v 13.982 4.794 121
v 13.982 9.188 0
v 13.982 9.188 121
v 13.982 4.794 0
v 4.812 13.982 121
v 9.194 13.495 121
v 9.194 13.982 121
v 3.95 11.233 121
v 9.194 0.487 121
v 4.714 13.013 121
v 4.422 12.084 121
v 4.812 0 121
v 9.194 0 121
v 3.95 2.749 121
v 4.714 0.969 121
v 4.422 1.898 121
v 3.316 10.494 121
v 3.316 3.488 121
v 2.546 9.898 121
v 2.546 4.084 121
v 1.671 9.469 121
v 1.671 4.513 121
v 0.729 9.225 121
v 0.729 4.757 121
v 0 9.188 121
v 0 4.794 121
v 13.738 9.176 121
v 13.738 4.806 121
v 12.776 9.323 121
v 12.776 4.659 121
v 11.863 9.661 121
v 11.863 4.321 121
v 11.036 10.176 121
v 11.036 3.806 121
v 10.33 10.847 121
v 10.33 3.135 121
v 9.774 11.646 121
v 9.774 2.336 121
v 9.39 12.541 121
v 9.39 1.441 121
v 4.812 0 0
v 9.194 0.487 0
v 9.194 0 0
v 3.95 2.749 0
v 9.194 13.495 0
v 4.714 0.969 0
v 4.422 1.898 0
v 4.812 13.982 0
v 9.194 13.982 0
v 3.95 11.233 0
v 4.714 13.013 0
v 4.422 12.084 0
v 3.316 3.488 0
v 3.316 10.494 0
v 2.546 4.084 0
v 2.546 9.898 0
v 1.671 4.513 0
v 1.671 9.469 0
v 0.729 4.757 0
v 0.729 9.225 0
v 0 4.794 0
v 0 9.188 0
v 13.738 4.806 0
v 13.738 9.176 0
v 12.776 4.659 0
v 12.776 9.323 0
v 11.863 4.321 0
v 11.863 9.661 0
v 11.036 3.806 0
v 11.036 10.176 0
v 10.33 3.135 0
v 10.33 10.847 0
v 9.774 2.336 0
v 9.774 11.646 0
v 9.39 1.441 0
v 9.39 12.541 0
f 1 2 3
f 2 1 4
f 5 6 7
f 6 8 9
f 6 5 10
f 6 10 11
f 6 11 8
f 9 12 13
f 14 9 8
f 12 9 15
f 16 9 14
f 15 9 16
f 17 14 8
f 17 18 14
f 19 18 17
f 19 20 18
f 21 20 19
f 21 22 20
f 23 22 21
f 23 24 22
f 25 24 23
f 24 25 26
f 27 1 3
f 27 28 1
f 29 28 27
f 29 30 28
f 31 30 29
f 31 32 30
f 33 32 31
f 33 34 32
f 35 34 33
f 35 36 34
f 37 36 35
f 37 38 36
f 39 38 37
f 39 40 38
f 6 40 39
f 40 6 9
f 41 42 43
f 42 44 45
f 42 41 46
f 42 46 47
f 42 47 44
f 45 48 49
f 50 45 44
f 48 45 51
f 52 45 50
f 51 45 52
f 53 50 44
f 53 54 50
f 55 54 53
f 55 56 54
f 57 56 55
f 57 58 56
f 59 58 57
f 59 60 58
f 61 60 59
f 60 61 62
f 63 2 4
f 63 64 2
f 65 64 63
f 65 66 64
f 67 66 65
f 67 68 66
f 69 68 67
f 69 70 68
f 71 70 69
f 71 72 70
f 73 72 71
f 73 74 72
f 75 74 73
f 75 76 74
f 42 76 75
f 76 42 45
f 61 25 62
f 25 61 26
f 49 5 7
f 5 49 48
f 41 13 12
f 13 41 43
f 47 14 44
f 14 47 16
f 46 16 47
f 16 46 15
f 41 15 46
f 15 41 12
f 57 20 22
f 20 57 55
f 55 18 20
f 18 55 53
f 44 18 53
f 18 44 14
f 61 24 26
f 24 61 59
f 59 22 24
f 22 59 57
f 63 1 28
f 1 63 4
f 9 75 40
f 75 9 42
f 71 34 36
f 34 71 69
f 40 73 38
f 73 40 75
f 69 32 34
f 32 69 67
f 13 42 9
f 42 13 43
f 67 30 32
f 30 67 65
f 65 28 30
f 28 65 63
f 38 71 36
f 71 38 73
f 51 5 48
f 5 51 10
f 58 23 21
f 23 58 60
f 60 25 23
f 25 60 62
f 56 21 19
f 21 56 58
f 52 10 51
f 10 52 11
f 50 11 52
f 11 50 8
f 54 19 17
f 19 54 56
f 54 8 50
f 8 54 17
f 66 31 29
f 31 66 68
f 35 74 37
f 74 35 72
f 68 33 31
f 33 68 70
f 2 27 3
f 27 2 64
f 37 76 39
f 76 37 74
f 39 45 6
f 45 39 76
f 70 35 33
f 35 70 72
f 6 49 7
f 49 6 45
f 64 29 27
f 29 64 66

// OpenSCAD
// file: config.scad
$rows = 8;
$columns = 8;
$height = 8.5;
$distance = 15;
$gutter = 8;

$led_diameter = 3;
$led_height = 5;
$flange_height = 1;
$flange_diameter = 3.5;
$flange_flat_diameter = 3.4;
$snug_clearance = 0.2;
$lead_diameter = 0.5;

$wire_guide_distance = 5.5;
$wire_guide_height = 2.5;

function extent(holes) = (holes - 1) * $distance + 2 * $gutter;
function snugly(diameter) = diameter / cos(180 / fragments(diameter)) + 2 * $snug_clearance;
function fragments(diameter) = $fn > 0.0 ? max(3.0, $fn) : ceil(max(min(360.0 / $fa, diameter * PI / $fs), 5));
// main file
$fs = 1;
$fa = 0.1;

include <config.scad>;

$gap_multiplier = 2.75;

difference() {
	cube([$distance - snugly($lead_diameter), $distance - snugly($lead_diameter), extent($rows)]);
	cylinder(h = extent($rows), d = $gap_multiplier * $flange_diameter);
	translate([$distance - snugly($lead_diameter), 0, 0]) cylinder(h = extent($rows), d = $gap_multiplier * $flange_diameter);
	translate([0, $distance - snugly($lead_diameter), 0]) cylinder(h = extent($rows), d = $gap_multiplier * $flange_diameter);
	translate([$distance - snugly($lead_diameter), $distance - snugly($lead_diameter)]) cylinder(h = extent($rows), d = $gap_multiplier * $flange_diameter);

}
